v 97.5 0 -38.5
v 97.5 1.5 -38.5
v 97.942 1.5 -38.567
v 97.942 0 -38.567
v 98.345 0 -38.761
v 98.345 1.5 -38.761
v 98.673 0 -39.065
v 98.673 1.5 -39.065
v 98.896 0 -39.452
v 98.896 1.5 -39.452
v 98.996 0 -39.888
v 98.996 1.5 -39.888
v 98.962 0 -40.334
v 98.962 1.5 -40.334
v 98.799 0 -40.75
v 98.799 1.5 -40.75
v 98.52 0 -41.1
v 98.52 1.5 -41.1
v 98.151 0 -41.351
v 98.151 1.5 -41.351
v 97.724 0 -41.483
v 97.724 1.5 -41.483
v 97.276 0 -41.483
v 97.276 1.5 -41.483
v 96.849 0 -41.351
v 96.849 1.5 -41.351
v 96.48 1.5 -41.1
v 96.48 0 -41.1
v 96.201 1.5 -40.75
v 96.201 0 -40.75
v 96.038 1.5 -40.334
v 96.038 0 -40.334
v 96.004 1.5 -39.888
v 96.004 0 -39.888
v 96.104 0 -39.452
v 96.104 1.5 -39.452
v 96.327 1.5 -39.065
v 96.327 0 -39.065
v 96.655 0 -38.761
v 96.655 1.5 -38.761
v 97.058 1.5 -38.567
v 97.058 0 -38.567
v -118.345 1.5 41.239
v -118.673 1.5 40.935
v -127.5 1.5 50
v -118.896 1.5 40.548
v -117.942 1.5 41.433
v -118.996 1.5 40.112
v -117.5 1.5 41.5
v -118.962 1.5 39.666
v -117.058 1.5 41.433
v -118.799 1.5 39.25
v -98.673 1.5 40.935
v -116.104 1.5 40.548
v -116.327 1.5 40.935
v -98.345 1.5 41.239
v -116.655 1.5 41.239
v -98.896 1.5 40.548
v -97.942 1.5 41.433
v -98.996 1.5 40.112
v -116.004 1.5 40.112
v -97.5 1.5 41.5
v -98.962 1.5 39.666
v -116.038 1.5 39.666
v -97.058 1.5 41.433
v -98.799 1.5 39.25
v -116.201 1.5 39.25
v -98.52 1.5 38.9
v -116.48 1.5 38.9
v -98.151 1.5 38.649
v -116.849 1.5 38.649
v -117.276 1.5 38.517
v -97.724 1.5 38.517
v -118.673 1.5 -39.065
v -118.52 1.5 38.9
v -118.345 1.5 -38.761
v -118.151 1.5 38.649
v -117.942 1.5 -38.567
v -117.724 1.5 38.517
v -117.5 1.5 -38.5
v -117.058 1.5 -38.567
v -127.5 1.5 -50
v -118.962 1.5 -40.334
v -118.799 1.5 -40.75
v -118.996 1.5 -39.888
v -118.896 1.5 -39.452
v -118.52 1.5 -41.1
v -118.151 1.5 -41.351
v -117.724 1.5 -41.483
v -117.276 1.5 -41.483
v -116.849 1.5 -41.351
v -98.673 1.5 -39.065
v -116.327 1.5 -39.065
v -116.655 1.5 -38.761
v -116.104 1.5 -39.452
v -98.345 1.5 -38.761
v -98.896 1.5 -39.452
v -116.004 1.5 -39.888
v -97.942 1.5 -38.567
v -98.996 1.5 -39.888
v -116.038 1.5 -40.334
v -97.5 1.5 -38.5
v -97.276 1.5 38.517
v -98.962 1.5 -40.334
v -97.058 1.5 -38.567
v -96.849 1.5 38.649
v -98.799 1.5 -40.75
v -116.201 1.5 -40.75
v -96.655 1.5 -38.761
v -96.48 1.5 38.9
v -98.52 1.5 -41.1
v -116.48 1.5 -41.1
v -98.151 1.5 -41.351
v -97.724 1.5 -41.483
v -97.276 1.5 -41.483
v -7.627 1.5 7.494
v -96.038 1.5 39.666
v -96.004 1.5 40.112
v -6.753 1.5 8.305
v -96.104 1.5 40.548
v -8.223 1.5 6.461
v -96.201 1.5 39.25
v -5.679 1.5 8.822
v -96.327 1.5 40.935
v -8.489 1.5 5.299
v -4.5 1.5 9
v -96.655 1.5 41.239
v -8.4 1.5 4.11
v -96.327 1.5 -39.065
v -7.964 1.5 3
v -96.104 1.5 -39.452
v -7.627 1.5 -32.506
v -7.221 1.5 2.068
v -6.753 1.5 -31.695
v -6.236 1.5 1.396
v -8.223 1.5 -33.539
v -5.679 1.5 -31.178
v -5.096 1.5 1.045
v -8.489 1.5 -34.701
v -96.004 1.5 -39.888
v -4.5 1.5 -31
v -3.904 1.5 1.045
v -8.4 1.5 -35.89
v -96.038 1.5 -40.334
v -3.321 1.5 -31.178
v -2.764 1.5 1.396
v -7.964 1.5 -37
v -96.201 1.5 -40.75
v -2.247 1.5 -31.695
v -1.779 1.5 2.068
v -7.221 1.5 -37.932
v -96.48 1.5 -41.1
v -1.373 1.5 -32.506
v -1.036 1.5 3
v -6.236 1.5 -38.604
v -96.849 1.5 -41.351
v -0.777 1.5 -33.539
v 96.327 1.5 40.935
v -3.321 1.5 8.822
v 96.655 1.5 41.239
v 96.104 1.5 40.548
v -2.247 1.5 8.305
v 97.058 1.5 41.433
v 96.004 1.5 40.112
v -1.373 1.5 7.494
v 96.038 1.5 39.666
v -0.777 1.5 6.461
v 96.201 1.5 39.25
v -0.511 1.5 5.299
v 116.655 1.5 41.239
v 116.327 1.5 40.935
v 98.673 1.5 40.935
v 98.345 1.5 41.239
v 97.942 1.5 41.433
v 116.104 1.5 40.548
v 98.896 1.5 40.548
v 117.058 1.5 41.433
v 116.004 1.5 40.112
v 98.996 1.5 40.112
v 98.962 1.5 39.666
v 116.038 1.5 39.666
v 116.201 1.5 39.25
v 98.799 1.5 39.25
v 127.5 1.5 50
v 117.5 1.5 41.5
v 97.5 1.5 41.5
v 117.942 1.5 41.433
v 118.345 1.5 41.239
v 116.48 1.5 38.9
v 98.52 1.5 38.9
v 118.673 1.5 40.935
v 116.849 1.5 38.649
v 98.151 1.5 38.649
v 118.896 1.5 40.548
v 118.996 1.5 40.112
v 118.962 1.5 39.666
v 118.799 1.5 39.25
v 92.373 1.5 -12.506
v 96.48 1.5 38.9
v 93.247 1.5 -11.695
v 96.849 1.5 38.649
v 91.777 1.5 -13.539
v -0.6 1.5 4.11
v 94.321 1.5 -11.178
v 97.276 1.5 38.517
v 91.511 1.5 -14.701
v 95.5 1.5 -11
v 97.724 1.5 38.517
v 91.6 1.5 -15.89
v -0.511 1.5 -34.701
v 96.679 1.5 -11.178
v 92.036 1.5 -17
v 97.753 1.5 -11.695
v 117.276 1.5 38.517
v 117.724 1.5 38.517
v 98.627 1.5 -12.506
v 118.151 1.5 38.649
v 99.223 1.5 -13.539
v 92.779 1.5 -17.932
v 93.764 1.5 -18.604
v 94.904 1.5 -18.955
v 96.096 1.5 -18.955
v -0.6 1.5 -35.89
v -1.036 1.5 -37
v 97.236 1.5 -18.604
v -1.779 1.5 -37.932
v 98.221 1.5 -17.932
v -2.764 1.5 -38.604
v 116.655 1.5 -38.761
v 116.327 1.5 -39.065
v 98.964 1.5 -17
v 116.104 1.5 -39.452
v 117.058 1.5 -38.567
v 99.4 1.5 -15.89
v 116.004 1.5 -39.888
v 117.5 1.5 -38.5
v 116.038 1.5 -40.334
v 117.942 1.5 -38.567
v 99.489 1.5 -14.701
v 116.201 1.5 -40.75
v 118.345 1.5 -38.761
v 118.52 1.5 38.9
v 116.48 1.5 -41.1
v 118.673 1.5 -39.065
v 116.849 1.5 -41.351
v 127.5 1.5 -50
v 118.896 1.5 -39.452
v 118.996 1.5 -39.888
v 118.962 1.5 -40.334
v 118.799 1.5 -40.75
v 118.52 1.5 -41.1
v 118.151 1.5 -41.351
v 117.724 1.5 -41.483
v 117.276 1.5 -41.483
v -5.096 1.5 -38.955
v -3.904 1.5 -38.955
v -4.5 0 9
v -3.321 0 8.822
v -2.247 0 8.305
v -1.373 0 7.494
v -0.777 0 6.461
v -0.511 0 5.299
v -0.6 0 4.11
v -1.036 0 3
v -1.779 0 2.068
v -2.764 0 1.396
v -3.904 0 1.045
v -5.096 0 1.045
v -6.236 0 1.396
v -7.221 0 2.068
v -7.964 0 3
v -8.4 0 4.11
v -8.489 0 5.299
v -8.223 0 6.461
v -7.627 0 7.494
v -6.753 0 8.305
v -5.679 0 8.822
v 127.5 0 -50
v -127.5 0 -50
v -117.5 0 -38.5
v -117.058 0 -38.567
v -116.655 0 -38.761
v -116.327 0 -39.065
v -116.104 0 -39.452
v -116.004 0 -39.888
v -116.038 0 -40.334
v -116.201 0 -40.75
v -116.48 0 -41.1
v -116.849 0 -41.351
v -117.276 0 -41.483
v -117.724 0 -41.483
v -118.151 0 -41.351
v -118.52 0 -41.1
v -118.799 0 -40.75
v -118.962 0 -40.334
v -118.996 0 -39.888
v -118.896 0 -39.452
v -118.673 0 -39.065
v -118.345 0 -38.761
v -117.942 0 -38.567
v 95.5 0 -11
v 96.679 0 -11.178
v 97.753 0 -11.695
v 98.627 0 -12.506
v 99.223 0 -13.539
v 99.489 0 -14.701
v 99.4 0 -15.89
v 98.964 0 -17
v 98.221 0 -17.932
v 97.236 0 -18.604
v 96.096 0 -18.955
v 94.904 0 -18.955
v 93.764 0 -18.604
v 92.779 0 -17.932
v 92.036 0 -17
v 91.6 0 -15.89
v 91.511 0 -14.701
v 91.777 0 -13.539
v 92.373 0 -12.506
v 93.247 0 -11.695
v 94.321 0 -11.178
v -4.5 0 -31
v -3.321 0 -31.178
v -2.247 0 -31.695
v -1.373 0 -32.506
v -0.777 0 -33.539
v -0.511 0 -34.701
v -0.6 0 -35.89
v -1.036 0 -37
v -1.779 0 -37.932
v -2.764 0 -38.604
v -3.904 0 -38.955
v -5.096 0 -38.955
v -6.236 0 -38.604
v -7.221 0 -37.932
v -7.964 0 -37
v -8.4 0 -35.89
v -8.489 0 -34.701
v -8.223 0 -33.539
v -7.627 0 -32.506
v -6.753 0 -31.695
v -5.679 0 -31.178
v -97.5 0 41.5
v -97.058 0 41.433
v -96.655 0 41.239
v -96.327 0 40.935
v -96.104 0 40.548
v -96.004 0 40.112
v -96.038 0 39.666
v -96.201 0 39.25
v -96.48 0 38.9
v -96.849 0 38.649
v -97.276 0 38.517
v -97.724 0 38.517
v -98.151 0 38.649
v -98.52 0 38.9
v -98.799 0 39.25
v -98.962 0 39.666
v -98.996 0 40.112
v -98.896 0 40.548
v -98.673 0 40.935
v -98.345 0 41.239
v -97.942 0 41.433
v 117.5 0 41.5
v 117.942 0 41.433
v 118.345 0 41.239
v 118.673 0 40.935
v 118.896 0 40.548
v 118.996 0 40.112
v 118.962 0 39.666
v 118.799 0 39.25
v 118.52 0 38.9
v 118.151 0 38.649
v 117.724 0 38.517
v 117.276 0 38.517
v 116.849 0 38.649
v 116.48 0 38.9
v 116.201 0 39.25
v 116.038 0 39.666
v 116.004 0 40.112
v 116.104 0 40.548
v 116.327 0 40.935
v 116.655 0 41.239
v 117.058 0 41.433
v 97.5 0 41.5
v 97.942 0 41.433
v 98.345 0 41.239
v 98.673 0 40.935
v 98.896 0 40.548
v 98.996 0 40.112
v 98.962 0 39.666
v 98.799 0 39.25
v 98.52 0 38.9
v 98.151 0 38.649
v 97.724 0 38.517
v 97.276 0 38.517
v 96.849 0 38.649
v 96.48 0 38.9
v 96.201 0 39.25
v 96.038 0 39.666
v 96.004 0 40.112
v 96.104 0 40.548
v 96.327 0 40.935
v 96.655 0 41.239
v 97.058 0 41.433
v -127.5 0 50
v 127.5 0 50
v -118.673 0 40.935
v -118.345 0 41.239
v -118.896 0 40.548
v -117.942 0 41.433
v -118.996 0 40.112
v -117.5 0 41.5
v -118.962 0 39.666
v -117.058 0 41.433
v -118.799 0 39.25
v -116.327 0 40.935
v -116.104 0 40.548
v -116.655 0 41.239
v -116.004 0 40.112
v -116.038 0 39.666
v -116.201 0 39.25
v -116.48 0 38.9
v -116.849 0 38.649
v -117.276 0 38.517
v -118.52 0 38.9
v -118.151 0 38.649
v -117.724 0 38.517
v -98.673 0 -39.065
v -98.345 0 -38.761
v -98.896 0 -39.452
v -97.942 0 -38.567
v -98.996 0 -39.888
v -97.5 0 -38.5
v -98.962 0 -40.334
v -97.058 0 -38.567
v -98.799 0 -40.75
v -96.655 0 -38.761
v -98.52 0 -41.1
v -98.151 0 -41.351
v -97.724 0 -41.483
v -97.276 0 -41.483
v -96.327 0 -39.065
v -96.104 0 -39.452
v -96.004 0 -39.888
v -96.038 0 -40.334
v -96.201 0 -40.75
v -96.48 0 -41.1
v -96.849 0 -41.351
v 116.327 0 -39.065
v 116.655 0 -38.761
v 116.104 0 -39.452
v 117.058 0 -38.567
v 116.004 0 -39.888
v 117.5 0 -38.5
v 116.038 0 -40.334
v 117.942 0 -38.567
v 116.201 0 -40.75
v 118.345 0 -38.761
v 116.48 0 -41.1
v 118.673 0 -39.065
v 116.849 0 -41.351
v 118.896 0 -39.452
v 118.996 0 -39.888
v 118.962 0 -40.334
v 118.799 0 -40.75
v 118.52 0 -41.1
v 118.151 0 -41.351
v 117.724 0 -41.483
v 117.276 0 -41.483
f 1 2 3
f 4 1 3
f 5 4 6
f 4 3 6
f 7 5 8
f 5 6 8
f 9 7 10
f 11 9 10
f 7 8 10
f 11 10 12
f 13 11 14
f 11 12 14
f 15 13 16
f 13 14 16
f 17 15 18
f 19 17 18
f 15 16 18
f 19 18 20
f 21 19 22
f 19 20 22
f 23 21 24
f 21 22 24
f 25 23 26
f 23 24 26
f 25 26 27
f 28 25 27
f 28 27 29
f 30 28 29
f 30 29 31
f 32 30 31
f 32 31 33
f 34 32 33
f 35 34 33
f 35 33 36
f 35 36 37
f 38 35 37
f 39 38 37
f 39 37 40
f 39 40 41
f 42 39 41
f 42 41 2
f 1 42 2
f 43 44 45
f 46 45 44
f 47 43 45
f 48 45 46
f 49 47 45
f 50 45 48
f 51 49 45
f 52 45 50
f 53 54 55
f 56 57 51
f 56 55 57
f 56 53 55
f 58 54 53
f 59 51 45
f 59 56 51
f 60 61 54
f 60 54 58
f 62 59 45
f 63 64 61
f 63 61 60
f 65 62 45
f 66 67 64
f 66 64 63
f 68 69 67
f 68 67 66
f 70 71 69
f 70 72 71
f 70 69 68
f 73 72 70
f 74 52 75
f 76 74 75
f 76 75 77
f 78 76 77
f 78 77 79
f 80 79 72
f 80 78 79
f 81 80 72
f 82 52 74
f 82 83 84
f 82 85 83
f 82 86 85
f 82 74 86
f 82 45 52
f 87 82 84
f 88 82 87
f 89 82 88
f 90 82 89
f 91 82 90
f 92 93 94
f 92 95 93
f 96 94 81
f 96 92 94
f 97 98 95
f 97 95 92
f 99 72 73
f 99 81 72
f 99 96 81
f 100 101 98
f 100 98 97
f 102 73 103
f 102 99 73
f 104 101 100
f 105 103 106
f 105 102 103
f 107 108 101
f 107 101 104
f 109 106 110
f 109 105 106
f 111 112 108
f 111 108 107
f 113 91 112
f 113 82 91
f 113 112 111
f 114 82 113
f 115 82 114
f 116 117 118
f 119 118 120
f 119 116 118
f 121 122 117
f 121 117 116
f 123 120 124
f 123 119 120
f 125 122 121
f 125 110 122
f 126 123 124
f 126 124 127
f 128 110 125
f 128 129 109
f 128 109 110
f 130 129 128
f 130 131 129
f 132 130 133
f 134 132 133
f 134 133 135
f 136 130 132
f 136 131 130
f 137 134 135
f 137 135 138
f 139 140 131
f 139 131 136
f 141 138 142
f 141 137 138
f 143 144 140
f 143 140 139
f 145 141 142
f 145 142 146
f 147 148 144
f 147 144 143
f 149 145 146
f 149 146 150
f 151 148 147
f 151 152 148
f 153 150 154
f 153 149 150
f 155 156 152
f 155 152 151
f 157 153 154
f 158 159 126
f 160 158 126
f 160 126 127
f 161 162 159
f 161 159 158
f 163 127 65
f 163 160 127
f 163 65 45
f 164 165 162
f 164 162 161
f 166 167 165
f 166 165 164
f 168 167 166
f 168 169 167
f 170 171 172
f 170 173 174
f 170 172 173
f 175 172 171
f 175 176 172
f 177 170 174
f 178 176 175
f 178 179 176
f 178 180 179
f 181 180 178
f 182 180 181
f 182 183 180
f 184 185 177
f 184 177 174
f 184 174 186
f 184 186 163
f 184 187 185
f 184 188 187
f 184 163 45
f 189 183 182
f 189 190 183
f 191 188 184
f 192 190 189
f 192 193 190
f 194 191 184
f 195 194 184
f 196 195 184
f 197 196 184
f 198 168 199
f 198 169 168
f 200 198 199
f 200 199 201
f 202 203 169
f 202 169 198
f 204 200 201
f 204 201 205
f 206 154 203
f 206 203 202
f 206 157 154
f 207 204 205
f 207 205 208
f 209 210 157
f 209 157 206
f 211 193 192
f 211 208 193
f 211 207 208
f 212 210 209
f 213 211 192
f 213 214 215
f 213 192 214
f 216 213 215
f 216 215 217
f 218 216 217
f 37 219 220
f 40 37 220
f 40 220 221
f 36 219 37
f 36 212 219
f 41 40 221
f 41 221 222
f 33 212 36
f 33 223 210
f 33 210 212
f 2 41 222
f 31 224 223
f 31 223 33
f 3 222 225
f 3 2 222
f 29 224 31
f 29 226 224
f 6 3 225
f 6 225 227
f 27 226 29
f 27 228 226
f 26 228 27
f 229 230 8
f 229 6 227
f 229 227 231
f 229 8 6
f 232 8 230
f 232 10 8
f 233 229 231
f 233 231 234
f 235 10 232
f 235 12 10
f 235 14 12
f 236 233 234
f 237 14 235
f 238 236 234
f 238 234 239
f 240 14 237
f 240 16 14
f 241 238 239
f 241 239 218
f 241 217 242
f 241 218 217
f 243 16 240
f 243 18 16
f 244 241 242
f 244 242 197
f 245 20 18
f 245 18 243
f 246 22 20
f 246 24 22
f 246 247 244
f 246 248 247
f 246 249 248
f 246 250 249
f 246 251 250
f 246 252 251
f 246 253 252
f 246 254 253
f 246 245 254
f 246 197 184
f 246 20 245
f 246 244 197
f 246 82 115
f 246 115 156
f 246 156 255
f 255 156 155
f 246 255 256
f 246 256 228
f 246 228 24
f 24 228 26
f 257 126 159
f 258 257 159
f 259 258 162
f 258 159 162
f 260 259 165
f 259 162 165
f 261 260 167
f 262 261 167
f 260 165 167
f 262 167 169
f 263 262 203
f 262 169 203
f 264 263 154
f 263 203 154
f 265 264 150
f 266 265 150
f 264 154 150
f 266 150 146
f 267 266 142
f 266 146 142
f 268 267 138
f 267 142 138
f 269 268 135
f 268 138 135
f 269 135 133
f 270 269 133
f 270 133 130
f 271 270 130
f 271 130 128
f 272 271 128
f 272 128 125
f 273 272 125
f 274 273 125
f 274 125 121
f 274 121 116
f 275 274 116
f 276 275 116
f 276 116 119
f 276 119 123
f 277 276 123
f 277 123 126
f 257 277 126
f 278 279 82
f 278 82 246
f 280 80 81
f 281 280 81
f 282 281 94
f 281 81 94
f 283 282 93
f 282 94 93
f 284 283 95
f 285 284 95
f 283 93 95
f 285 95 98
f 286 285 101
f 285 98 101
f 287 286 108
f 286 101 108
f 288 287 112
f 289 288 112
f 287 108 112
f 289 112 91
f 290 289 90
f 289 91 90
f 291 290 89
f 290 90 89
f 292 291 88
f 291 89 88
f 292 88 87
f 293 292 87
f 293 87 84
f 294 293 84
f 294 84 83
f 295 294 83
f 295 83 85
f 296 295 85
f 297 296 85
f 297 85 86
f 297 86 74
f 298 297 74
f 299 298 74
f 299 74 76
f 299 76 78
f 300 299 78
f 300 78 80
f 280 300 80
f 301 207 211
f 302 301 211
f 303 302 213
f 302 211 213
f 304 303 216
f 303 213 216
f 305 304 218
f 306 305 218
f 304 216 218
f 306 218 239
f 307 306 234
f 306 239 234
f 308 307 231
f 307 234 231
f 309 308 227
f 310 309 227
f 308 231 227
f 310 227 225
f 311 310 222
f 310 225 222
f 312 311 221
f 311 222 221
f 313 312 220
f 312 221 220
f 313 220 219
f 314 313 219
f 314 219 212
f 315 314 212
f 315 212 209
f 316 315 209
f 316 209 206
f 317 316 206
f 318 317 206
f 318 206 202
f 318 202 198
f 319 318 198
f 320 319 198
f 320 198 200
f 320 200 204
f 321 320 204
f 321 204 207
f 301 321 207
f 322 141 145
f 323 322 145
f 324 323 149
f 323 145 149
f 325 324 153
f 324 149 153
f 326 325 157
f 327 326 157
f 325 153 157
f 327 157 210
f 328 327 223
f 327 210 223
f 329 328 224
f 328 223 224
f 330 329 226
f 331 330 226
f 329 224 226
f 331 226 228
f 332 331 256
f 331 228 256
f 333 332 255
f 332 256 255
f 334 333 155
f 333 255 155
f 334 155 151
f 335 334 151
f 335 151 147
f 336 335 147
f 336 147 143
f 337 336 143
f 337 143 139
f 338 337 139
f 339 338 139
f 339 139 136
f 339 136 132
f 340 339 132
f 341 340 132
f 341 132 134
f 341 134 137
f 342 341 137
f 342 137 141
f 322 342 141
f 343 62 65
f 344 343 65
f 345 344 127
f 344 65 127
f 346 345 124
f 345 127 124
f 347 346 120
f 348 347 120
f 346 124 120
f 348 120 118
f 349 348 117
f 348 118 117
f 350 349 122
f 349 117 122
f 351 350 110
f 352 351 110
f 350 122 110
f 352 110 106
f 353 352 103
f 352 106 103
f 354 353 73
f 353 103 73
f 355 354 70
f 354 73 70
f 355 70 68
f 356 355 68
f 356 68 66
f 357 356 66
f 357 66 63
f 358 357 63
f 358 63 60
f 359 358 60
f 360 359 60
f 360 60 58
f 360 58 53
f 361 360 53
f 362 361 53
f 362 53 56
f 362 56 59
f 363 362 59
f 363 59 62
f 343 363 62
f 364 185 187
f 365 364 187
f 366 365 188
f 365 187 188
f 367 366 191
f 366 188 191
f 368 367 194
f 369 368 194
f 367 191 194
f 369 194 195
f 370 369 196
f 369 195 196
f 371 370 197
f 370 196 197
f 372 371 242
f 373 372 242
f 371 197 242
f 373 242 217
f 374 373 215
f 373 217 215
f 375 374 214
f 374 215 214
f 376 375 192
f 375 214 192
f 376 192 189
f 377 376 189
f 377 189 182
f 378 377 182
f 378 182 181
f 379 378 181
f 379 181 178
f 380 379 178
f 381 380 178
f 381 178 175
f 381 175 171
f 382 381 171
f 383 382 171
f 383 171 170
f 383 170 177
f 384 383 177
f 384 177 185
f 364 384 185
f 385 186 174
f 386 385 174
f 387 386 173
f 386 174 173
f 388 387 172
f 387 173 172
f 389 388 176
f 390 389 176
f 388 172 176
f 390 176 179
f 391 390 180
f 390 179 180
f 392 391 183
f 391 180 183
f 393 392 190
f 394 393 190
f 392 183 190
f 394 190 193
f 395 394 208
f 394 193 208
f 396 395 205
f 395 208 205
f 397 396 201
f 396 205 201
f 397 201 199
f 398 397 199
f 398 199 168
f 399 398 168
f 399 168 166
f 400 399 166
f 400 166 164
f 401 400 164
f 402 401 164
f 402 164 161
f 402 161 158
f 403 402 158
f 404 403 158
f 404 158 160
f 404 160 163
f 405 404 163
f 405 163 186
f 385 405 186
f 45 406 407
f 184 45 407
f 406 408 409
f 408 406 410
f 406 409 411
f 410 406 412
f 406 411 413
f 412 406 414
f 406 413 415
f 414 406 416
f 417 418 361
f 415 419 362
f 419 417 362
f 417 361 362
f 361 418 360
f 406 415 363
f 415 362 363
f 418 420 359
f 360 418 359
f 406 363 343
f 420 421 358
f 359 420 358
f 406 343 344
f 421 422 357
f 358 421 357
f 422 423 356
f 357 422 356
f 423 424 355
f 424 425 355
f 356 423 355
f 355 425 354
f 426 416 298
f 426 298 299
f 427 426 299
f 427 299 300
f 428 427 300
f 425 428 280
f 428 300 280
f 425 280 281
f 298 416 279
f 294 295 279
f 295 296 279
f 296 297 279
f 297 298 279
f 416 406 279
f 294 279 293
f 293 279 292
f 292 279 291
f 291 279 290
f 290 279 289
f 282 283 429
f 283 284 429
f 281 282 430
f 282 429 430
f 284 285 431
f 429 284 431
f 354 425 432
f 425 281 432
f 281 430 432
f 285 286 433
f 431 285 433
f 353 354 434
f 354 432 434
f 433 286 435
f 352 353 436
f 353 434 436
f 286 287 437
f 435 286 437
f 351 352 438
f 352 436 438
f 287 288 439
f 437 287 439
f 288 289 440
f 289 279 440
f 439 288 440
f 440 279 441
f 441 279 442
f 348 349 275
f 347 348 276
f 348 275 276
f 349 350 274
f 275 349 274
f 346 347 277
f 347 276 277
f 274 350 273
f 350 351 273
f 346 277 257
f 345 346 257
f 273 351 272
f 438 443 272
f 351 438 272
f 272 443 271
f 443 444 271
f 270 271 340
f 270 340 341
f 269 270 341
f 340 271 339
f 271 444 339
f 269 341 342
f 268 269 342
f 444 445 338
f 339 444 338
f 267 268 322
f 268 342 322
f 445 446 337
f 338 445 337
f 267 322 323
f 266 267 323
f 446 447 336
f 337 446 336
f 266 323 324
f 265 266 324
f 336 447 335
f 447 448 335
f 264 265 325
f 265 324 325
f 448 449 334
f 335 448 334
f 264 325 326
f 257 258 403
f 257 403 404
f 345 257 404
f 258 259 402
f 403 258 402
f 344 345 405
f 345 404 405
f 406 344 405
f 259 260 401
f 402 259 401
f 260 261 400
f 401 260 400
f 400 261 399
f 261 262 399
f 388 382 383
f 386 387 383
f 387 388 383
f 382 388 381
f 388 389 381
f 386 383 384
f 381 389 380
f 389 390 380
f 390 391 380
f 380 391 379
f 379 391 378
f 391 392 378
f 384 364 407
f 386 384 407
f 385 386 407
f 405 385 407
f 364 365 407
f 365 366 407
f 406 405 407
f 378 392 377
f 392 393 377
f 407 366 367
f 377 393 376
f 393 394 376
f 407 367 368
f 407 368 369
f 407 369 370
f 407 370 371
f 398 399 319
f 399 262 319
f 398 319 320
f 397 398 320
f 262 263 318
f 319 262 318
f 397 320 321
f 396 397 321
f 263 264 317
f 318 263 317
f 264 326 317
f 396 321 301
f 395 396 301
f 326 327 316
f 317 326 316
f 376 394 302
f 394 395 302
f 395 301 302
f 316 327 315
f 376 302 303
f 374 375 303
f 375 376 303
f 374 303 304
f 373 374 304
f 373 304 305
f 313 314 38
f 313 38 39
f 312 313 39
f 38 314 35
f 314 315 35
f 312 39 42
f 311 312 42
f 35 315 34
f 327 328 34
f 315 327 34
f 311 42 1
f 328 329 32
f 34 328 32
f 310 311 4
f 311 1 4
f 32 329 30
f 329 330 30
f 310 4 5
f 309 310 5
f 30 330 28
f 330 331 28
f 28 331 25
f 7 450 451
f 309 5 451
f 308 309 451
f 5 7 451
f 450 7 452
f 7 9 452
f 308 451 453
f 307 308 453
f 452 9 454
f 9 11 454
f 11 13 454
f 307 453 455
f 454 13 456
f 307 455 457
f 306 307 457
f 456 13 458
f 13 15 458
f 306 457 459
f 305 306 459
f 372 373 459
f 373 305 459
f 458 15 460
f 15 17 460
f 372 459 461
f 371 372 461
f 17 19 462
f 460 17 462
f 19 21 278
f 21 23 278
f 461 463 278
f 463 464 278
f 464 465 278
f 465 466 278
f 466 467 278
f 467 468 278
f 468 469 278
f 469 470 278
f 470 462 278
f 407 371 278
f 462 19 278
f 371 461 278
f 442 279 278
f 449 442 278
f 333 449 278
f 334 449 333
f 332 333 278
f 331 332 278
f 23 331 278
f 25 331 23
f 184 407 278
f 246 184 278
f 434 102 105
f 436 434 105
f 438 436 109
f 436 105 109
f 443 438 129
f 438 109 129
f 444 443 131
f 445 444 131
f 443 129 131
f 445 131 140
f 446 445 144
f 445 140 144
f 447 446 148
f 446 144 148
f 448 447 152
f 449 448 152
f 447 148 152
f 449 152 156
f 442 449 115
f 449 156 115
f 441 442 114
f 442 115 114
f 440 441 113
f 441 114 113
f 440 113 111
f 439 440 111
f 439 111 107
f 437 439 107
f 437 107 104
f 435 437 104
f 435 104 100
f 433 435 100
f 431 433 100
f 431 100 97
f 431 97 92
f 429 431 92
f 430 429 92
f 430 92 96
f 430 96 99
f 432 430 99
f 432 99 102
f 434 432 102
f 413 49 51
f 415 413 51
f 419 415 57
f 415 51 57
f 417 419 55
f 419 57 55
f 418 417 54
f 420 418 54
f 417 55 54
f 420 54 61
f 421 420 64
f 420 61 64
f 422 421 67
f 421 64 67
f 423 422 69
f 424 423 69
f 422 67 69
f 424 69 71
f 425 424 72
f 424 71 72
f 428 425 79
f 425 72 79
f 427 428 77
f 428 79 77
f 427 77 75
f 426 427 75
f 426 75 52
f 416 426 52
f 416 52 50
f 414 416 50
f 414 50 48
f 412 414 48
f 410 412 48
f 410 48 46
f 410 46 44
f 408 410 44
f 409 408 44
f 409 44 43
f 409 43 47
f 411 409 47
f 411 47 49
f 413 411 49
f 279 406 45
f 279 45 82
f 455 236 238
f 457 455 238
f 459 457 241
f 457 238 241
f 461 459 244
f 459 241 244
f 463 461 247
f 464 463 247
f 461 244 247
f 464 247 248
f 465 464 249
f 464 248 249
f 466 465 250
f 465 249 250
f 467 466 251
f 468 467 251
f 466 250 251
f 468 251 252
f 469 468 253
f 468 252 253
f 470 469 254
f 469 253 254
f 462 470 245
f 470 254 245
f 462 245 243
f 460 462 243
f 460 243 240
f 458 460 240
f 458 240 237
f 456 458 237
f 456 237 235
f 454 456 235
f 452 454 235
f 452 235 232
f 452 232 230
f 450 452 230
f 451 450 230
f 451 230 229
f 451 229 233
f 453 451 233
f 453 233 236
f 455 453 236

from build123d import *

# Parameters (mm, degrees)
SKETCH1_W           = 255
SKETCH1_H           = 100
BOSS_EXTRUDE1_DEPTH = 1.5
SKETCH2_R           = 1.5
CUT_EXTRUDE2_DEPTH  = 10
SKETCH4_R           = 4
CUT_EXTRUDE3_DEPTH  = 137.961673471


with BuildPart() as part:
    # Sketch1 → Boss-Extrude1 (new body)
    with BuildSketch(Plane(origin=(0, 0, 0), x_dir=(1, 0, 0), z_dir=(0, 1, 0))):
        Rectangle(SKETCH1_W, SKETCH1_H)
    extrude(amount=BOSS_EXTRUDE1_DEPTH)

    # Sketch2 → Cut-Extrude2 (cut)
    with BuildSketch(Plane(origin=(0, 1.5, 0), x_dir=(1, 0, 0), z_dir=(0, 1, 0))):
        with Locations(Location((117.5, 40, 0), (0, 0, 270))):
            Circle(SKETCH2_R)
        with Locations(Location((97.5, 40, 0), (0, 0, 270))):
            Circle(SKETCH2_R)
        with Locations(Location((97.5, -40, 0), (0, 0, 270))):
            Circle(SKETCH2_R)
        with Locations(Location((117.5, -40, 0), (0, 0, 270))):
            Circle(SKETCH2_R)
        with Locations(Location((-97.5, 40, 0), (0, 0, 270))):
            Circle(SKETCH2_R)
        with Locations(Location((-117.5, 40, 0), (0, 0, 270))):
            Circle(SKETCH2_R)
        with Locations(Location((-117.5, -40, 0), (0, 0, 270))):
            Circle(SKETCH2_R)
        with Locations(Location((-97.5, -40, 0), (0, 0, 270))):
            Circle(SKETCH2_R)
    extrude(amount=-CUT_EXTRUDE2_DEPTH, mode=Mode.SUBTRACT)

    # Sketch4 → Cut-Extrude3 (cut, through all)
    with BuildSketch(Plane(origin=(0, 1.5, 0), x_dir=(1, 0, 0), z_dir=(0, 1, 0))):
        with Locations(Location((95.5, 15, 0), (0, 0, 270))):
            Circle(SKETCH4_R)
        with Locations(Location((-4.5, 35, 0), (0, 0, 270))):
            Circle(SKETCH4_R)
        with Locations(Location((-4.5, -5, 0), (0, 0, 270))):
            Circle(SKETCH4_R)
    extrude(amount=-CUT_EXTRUDE3_DEPTH, mode=Mode.SUBTRACT)


solid = part.part
